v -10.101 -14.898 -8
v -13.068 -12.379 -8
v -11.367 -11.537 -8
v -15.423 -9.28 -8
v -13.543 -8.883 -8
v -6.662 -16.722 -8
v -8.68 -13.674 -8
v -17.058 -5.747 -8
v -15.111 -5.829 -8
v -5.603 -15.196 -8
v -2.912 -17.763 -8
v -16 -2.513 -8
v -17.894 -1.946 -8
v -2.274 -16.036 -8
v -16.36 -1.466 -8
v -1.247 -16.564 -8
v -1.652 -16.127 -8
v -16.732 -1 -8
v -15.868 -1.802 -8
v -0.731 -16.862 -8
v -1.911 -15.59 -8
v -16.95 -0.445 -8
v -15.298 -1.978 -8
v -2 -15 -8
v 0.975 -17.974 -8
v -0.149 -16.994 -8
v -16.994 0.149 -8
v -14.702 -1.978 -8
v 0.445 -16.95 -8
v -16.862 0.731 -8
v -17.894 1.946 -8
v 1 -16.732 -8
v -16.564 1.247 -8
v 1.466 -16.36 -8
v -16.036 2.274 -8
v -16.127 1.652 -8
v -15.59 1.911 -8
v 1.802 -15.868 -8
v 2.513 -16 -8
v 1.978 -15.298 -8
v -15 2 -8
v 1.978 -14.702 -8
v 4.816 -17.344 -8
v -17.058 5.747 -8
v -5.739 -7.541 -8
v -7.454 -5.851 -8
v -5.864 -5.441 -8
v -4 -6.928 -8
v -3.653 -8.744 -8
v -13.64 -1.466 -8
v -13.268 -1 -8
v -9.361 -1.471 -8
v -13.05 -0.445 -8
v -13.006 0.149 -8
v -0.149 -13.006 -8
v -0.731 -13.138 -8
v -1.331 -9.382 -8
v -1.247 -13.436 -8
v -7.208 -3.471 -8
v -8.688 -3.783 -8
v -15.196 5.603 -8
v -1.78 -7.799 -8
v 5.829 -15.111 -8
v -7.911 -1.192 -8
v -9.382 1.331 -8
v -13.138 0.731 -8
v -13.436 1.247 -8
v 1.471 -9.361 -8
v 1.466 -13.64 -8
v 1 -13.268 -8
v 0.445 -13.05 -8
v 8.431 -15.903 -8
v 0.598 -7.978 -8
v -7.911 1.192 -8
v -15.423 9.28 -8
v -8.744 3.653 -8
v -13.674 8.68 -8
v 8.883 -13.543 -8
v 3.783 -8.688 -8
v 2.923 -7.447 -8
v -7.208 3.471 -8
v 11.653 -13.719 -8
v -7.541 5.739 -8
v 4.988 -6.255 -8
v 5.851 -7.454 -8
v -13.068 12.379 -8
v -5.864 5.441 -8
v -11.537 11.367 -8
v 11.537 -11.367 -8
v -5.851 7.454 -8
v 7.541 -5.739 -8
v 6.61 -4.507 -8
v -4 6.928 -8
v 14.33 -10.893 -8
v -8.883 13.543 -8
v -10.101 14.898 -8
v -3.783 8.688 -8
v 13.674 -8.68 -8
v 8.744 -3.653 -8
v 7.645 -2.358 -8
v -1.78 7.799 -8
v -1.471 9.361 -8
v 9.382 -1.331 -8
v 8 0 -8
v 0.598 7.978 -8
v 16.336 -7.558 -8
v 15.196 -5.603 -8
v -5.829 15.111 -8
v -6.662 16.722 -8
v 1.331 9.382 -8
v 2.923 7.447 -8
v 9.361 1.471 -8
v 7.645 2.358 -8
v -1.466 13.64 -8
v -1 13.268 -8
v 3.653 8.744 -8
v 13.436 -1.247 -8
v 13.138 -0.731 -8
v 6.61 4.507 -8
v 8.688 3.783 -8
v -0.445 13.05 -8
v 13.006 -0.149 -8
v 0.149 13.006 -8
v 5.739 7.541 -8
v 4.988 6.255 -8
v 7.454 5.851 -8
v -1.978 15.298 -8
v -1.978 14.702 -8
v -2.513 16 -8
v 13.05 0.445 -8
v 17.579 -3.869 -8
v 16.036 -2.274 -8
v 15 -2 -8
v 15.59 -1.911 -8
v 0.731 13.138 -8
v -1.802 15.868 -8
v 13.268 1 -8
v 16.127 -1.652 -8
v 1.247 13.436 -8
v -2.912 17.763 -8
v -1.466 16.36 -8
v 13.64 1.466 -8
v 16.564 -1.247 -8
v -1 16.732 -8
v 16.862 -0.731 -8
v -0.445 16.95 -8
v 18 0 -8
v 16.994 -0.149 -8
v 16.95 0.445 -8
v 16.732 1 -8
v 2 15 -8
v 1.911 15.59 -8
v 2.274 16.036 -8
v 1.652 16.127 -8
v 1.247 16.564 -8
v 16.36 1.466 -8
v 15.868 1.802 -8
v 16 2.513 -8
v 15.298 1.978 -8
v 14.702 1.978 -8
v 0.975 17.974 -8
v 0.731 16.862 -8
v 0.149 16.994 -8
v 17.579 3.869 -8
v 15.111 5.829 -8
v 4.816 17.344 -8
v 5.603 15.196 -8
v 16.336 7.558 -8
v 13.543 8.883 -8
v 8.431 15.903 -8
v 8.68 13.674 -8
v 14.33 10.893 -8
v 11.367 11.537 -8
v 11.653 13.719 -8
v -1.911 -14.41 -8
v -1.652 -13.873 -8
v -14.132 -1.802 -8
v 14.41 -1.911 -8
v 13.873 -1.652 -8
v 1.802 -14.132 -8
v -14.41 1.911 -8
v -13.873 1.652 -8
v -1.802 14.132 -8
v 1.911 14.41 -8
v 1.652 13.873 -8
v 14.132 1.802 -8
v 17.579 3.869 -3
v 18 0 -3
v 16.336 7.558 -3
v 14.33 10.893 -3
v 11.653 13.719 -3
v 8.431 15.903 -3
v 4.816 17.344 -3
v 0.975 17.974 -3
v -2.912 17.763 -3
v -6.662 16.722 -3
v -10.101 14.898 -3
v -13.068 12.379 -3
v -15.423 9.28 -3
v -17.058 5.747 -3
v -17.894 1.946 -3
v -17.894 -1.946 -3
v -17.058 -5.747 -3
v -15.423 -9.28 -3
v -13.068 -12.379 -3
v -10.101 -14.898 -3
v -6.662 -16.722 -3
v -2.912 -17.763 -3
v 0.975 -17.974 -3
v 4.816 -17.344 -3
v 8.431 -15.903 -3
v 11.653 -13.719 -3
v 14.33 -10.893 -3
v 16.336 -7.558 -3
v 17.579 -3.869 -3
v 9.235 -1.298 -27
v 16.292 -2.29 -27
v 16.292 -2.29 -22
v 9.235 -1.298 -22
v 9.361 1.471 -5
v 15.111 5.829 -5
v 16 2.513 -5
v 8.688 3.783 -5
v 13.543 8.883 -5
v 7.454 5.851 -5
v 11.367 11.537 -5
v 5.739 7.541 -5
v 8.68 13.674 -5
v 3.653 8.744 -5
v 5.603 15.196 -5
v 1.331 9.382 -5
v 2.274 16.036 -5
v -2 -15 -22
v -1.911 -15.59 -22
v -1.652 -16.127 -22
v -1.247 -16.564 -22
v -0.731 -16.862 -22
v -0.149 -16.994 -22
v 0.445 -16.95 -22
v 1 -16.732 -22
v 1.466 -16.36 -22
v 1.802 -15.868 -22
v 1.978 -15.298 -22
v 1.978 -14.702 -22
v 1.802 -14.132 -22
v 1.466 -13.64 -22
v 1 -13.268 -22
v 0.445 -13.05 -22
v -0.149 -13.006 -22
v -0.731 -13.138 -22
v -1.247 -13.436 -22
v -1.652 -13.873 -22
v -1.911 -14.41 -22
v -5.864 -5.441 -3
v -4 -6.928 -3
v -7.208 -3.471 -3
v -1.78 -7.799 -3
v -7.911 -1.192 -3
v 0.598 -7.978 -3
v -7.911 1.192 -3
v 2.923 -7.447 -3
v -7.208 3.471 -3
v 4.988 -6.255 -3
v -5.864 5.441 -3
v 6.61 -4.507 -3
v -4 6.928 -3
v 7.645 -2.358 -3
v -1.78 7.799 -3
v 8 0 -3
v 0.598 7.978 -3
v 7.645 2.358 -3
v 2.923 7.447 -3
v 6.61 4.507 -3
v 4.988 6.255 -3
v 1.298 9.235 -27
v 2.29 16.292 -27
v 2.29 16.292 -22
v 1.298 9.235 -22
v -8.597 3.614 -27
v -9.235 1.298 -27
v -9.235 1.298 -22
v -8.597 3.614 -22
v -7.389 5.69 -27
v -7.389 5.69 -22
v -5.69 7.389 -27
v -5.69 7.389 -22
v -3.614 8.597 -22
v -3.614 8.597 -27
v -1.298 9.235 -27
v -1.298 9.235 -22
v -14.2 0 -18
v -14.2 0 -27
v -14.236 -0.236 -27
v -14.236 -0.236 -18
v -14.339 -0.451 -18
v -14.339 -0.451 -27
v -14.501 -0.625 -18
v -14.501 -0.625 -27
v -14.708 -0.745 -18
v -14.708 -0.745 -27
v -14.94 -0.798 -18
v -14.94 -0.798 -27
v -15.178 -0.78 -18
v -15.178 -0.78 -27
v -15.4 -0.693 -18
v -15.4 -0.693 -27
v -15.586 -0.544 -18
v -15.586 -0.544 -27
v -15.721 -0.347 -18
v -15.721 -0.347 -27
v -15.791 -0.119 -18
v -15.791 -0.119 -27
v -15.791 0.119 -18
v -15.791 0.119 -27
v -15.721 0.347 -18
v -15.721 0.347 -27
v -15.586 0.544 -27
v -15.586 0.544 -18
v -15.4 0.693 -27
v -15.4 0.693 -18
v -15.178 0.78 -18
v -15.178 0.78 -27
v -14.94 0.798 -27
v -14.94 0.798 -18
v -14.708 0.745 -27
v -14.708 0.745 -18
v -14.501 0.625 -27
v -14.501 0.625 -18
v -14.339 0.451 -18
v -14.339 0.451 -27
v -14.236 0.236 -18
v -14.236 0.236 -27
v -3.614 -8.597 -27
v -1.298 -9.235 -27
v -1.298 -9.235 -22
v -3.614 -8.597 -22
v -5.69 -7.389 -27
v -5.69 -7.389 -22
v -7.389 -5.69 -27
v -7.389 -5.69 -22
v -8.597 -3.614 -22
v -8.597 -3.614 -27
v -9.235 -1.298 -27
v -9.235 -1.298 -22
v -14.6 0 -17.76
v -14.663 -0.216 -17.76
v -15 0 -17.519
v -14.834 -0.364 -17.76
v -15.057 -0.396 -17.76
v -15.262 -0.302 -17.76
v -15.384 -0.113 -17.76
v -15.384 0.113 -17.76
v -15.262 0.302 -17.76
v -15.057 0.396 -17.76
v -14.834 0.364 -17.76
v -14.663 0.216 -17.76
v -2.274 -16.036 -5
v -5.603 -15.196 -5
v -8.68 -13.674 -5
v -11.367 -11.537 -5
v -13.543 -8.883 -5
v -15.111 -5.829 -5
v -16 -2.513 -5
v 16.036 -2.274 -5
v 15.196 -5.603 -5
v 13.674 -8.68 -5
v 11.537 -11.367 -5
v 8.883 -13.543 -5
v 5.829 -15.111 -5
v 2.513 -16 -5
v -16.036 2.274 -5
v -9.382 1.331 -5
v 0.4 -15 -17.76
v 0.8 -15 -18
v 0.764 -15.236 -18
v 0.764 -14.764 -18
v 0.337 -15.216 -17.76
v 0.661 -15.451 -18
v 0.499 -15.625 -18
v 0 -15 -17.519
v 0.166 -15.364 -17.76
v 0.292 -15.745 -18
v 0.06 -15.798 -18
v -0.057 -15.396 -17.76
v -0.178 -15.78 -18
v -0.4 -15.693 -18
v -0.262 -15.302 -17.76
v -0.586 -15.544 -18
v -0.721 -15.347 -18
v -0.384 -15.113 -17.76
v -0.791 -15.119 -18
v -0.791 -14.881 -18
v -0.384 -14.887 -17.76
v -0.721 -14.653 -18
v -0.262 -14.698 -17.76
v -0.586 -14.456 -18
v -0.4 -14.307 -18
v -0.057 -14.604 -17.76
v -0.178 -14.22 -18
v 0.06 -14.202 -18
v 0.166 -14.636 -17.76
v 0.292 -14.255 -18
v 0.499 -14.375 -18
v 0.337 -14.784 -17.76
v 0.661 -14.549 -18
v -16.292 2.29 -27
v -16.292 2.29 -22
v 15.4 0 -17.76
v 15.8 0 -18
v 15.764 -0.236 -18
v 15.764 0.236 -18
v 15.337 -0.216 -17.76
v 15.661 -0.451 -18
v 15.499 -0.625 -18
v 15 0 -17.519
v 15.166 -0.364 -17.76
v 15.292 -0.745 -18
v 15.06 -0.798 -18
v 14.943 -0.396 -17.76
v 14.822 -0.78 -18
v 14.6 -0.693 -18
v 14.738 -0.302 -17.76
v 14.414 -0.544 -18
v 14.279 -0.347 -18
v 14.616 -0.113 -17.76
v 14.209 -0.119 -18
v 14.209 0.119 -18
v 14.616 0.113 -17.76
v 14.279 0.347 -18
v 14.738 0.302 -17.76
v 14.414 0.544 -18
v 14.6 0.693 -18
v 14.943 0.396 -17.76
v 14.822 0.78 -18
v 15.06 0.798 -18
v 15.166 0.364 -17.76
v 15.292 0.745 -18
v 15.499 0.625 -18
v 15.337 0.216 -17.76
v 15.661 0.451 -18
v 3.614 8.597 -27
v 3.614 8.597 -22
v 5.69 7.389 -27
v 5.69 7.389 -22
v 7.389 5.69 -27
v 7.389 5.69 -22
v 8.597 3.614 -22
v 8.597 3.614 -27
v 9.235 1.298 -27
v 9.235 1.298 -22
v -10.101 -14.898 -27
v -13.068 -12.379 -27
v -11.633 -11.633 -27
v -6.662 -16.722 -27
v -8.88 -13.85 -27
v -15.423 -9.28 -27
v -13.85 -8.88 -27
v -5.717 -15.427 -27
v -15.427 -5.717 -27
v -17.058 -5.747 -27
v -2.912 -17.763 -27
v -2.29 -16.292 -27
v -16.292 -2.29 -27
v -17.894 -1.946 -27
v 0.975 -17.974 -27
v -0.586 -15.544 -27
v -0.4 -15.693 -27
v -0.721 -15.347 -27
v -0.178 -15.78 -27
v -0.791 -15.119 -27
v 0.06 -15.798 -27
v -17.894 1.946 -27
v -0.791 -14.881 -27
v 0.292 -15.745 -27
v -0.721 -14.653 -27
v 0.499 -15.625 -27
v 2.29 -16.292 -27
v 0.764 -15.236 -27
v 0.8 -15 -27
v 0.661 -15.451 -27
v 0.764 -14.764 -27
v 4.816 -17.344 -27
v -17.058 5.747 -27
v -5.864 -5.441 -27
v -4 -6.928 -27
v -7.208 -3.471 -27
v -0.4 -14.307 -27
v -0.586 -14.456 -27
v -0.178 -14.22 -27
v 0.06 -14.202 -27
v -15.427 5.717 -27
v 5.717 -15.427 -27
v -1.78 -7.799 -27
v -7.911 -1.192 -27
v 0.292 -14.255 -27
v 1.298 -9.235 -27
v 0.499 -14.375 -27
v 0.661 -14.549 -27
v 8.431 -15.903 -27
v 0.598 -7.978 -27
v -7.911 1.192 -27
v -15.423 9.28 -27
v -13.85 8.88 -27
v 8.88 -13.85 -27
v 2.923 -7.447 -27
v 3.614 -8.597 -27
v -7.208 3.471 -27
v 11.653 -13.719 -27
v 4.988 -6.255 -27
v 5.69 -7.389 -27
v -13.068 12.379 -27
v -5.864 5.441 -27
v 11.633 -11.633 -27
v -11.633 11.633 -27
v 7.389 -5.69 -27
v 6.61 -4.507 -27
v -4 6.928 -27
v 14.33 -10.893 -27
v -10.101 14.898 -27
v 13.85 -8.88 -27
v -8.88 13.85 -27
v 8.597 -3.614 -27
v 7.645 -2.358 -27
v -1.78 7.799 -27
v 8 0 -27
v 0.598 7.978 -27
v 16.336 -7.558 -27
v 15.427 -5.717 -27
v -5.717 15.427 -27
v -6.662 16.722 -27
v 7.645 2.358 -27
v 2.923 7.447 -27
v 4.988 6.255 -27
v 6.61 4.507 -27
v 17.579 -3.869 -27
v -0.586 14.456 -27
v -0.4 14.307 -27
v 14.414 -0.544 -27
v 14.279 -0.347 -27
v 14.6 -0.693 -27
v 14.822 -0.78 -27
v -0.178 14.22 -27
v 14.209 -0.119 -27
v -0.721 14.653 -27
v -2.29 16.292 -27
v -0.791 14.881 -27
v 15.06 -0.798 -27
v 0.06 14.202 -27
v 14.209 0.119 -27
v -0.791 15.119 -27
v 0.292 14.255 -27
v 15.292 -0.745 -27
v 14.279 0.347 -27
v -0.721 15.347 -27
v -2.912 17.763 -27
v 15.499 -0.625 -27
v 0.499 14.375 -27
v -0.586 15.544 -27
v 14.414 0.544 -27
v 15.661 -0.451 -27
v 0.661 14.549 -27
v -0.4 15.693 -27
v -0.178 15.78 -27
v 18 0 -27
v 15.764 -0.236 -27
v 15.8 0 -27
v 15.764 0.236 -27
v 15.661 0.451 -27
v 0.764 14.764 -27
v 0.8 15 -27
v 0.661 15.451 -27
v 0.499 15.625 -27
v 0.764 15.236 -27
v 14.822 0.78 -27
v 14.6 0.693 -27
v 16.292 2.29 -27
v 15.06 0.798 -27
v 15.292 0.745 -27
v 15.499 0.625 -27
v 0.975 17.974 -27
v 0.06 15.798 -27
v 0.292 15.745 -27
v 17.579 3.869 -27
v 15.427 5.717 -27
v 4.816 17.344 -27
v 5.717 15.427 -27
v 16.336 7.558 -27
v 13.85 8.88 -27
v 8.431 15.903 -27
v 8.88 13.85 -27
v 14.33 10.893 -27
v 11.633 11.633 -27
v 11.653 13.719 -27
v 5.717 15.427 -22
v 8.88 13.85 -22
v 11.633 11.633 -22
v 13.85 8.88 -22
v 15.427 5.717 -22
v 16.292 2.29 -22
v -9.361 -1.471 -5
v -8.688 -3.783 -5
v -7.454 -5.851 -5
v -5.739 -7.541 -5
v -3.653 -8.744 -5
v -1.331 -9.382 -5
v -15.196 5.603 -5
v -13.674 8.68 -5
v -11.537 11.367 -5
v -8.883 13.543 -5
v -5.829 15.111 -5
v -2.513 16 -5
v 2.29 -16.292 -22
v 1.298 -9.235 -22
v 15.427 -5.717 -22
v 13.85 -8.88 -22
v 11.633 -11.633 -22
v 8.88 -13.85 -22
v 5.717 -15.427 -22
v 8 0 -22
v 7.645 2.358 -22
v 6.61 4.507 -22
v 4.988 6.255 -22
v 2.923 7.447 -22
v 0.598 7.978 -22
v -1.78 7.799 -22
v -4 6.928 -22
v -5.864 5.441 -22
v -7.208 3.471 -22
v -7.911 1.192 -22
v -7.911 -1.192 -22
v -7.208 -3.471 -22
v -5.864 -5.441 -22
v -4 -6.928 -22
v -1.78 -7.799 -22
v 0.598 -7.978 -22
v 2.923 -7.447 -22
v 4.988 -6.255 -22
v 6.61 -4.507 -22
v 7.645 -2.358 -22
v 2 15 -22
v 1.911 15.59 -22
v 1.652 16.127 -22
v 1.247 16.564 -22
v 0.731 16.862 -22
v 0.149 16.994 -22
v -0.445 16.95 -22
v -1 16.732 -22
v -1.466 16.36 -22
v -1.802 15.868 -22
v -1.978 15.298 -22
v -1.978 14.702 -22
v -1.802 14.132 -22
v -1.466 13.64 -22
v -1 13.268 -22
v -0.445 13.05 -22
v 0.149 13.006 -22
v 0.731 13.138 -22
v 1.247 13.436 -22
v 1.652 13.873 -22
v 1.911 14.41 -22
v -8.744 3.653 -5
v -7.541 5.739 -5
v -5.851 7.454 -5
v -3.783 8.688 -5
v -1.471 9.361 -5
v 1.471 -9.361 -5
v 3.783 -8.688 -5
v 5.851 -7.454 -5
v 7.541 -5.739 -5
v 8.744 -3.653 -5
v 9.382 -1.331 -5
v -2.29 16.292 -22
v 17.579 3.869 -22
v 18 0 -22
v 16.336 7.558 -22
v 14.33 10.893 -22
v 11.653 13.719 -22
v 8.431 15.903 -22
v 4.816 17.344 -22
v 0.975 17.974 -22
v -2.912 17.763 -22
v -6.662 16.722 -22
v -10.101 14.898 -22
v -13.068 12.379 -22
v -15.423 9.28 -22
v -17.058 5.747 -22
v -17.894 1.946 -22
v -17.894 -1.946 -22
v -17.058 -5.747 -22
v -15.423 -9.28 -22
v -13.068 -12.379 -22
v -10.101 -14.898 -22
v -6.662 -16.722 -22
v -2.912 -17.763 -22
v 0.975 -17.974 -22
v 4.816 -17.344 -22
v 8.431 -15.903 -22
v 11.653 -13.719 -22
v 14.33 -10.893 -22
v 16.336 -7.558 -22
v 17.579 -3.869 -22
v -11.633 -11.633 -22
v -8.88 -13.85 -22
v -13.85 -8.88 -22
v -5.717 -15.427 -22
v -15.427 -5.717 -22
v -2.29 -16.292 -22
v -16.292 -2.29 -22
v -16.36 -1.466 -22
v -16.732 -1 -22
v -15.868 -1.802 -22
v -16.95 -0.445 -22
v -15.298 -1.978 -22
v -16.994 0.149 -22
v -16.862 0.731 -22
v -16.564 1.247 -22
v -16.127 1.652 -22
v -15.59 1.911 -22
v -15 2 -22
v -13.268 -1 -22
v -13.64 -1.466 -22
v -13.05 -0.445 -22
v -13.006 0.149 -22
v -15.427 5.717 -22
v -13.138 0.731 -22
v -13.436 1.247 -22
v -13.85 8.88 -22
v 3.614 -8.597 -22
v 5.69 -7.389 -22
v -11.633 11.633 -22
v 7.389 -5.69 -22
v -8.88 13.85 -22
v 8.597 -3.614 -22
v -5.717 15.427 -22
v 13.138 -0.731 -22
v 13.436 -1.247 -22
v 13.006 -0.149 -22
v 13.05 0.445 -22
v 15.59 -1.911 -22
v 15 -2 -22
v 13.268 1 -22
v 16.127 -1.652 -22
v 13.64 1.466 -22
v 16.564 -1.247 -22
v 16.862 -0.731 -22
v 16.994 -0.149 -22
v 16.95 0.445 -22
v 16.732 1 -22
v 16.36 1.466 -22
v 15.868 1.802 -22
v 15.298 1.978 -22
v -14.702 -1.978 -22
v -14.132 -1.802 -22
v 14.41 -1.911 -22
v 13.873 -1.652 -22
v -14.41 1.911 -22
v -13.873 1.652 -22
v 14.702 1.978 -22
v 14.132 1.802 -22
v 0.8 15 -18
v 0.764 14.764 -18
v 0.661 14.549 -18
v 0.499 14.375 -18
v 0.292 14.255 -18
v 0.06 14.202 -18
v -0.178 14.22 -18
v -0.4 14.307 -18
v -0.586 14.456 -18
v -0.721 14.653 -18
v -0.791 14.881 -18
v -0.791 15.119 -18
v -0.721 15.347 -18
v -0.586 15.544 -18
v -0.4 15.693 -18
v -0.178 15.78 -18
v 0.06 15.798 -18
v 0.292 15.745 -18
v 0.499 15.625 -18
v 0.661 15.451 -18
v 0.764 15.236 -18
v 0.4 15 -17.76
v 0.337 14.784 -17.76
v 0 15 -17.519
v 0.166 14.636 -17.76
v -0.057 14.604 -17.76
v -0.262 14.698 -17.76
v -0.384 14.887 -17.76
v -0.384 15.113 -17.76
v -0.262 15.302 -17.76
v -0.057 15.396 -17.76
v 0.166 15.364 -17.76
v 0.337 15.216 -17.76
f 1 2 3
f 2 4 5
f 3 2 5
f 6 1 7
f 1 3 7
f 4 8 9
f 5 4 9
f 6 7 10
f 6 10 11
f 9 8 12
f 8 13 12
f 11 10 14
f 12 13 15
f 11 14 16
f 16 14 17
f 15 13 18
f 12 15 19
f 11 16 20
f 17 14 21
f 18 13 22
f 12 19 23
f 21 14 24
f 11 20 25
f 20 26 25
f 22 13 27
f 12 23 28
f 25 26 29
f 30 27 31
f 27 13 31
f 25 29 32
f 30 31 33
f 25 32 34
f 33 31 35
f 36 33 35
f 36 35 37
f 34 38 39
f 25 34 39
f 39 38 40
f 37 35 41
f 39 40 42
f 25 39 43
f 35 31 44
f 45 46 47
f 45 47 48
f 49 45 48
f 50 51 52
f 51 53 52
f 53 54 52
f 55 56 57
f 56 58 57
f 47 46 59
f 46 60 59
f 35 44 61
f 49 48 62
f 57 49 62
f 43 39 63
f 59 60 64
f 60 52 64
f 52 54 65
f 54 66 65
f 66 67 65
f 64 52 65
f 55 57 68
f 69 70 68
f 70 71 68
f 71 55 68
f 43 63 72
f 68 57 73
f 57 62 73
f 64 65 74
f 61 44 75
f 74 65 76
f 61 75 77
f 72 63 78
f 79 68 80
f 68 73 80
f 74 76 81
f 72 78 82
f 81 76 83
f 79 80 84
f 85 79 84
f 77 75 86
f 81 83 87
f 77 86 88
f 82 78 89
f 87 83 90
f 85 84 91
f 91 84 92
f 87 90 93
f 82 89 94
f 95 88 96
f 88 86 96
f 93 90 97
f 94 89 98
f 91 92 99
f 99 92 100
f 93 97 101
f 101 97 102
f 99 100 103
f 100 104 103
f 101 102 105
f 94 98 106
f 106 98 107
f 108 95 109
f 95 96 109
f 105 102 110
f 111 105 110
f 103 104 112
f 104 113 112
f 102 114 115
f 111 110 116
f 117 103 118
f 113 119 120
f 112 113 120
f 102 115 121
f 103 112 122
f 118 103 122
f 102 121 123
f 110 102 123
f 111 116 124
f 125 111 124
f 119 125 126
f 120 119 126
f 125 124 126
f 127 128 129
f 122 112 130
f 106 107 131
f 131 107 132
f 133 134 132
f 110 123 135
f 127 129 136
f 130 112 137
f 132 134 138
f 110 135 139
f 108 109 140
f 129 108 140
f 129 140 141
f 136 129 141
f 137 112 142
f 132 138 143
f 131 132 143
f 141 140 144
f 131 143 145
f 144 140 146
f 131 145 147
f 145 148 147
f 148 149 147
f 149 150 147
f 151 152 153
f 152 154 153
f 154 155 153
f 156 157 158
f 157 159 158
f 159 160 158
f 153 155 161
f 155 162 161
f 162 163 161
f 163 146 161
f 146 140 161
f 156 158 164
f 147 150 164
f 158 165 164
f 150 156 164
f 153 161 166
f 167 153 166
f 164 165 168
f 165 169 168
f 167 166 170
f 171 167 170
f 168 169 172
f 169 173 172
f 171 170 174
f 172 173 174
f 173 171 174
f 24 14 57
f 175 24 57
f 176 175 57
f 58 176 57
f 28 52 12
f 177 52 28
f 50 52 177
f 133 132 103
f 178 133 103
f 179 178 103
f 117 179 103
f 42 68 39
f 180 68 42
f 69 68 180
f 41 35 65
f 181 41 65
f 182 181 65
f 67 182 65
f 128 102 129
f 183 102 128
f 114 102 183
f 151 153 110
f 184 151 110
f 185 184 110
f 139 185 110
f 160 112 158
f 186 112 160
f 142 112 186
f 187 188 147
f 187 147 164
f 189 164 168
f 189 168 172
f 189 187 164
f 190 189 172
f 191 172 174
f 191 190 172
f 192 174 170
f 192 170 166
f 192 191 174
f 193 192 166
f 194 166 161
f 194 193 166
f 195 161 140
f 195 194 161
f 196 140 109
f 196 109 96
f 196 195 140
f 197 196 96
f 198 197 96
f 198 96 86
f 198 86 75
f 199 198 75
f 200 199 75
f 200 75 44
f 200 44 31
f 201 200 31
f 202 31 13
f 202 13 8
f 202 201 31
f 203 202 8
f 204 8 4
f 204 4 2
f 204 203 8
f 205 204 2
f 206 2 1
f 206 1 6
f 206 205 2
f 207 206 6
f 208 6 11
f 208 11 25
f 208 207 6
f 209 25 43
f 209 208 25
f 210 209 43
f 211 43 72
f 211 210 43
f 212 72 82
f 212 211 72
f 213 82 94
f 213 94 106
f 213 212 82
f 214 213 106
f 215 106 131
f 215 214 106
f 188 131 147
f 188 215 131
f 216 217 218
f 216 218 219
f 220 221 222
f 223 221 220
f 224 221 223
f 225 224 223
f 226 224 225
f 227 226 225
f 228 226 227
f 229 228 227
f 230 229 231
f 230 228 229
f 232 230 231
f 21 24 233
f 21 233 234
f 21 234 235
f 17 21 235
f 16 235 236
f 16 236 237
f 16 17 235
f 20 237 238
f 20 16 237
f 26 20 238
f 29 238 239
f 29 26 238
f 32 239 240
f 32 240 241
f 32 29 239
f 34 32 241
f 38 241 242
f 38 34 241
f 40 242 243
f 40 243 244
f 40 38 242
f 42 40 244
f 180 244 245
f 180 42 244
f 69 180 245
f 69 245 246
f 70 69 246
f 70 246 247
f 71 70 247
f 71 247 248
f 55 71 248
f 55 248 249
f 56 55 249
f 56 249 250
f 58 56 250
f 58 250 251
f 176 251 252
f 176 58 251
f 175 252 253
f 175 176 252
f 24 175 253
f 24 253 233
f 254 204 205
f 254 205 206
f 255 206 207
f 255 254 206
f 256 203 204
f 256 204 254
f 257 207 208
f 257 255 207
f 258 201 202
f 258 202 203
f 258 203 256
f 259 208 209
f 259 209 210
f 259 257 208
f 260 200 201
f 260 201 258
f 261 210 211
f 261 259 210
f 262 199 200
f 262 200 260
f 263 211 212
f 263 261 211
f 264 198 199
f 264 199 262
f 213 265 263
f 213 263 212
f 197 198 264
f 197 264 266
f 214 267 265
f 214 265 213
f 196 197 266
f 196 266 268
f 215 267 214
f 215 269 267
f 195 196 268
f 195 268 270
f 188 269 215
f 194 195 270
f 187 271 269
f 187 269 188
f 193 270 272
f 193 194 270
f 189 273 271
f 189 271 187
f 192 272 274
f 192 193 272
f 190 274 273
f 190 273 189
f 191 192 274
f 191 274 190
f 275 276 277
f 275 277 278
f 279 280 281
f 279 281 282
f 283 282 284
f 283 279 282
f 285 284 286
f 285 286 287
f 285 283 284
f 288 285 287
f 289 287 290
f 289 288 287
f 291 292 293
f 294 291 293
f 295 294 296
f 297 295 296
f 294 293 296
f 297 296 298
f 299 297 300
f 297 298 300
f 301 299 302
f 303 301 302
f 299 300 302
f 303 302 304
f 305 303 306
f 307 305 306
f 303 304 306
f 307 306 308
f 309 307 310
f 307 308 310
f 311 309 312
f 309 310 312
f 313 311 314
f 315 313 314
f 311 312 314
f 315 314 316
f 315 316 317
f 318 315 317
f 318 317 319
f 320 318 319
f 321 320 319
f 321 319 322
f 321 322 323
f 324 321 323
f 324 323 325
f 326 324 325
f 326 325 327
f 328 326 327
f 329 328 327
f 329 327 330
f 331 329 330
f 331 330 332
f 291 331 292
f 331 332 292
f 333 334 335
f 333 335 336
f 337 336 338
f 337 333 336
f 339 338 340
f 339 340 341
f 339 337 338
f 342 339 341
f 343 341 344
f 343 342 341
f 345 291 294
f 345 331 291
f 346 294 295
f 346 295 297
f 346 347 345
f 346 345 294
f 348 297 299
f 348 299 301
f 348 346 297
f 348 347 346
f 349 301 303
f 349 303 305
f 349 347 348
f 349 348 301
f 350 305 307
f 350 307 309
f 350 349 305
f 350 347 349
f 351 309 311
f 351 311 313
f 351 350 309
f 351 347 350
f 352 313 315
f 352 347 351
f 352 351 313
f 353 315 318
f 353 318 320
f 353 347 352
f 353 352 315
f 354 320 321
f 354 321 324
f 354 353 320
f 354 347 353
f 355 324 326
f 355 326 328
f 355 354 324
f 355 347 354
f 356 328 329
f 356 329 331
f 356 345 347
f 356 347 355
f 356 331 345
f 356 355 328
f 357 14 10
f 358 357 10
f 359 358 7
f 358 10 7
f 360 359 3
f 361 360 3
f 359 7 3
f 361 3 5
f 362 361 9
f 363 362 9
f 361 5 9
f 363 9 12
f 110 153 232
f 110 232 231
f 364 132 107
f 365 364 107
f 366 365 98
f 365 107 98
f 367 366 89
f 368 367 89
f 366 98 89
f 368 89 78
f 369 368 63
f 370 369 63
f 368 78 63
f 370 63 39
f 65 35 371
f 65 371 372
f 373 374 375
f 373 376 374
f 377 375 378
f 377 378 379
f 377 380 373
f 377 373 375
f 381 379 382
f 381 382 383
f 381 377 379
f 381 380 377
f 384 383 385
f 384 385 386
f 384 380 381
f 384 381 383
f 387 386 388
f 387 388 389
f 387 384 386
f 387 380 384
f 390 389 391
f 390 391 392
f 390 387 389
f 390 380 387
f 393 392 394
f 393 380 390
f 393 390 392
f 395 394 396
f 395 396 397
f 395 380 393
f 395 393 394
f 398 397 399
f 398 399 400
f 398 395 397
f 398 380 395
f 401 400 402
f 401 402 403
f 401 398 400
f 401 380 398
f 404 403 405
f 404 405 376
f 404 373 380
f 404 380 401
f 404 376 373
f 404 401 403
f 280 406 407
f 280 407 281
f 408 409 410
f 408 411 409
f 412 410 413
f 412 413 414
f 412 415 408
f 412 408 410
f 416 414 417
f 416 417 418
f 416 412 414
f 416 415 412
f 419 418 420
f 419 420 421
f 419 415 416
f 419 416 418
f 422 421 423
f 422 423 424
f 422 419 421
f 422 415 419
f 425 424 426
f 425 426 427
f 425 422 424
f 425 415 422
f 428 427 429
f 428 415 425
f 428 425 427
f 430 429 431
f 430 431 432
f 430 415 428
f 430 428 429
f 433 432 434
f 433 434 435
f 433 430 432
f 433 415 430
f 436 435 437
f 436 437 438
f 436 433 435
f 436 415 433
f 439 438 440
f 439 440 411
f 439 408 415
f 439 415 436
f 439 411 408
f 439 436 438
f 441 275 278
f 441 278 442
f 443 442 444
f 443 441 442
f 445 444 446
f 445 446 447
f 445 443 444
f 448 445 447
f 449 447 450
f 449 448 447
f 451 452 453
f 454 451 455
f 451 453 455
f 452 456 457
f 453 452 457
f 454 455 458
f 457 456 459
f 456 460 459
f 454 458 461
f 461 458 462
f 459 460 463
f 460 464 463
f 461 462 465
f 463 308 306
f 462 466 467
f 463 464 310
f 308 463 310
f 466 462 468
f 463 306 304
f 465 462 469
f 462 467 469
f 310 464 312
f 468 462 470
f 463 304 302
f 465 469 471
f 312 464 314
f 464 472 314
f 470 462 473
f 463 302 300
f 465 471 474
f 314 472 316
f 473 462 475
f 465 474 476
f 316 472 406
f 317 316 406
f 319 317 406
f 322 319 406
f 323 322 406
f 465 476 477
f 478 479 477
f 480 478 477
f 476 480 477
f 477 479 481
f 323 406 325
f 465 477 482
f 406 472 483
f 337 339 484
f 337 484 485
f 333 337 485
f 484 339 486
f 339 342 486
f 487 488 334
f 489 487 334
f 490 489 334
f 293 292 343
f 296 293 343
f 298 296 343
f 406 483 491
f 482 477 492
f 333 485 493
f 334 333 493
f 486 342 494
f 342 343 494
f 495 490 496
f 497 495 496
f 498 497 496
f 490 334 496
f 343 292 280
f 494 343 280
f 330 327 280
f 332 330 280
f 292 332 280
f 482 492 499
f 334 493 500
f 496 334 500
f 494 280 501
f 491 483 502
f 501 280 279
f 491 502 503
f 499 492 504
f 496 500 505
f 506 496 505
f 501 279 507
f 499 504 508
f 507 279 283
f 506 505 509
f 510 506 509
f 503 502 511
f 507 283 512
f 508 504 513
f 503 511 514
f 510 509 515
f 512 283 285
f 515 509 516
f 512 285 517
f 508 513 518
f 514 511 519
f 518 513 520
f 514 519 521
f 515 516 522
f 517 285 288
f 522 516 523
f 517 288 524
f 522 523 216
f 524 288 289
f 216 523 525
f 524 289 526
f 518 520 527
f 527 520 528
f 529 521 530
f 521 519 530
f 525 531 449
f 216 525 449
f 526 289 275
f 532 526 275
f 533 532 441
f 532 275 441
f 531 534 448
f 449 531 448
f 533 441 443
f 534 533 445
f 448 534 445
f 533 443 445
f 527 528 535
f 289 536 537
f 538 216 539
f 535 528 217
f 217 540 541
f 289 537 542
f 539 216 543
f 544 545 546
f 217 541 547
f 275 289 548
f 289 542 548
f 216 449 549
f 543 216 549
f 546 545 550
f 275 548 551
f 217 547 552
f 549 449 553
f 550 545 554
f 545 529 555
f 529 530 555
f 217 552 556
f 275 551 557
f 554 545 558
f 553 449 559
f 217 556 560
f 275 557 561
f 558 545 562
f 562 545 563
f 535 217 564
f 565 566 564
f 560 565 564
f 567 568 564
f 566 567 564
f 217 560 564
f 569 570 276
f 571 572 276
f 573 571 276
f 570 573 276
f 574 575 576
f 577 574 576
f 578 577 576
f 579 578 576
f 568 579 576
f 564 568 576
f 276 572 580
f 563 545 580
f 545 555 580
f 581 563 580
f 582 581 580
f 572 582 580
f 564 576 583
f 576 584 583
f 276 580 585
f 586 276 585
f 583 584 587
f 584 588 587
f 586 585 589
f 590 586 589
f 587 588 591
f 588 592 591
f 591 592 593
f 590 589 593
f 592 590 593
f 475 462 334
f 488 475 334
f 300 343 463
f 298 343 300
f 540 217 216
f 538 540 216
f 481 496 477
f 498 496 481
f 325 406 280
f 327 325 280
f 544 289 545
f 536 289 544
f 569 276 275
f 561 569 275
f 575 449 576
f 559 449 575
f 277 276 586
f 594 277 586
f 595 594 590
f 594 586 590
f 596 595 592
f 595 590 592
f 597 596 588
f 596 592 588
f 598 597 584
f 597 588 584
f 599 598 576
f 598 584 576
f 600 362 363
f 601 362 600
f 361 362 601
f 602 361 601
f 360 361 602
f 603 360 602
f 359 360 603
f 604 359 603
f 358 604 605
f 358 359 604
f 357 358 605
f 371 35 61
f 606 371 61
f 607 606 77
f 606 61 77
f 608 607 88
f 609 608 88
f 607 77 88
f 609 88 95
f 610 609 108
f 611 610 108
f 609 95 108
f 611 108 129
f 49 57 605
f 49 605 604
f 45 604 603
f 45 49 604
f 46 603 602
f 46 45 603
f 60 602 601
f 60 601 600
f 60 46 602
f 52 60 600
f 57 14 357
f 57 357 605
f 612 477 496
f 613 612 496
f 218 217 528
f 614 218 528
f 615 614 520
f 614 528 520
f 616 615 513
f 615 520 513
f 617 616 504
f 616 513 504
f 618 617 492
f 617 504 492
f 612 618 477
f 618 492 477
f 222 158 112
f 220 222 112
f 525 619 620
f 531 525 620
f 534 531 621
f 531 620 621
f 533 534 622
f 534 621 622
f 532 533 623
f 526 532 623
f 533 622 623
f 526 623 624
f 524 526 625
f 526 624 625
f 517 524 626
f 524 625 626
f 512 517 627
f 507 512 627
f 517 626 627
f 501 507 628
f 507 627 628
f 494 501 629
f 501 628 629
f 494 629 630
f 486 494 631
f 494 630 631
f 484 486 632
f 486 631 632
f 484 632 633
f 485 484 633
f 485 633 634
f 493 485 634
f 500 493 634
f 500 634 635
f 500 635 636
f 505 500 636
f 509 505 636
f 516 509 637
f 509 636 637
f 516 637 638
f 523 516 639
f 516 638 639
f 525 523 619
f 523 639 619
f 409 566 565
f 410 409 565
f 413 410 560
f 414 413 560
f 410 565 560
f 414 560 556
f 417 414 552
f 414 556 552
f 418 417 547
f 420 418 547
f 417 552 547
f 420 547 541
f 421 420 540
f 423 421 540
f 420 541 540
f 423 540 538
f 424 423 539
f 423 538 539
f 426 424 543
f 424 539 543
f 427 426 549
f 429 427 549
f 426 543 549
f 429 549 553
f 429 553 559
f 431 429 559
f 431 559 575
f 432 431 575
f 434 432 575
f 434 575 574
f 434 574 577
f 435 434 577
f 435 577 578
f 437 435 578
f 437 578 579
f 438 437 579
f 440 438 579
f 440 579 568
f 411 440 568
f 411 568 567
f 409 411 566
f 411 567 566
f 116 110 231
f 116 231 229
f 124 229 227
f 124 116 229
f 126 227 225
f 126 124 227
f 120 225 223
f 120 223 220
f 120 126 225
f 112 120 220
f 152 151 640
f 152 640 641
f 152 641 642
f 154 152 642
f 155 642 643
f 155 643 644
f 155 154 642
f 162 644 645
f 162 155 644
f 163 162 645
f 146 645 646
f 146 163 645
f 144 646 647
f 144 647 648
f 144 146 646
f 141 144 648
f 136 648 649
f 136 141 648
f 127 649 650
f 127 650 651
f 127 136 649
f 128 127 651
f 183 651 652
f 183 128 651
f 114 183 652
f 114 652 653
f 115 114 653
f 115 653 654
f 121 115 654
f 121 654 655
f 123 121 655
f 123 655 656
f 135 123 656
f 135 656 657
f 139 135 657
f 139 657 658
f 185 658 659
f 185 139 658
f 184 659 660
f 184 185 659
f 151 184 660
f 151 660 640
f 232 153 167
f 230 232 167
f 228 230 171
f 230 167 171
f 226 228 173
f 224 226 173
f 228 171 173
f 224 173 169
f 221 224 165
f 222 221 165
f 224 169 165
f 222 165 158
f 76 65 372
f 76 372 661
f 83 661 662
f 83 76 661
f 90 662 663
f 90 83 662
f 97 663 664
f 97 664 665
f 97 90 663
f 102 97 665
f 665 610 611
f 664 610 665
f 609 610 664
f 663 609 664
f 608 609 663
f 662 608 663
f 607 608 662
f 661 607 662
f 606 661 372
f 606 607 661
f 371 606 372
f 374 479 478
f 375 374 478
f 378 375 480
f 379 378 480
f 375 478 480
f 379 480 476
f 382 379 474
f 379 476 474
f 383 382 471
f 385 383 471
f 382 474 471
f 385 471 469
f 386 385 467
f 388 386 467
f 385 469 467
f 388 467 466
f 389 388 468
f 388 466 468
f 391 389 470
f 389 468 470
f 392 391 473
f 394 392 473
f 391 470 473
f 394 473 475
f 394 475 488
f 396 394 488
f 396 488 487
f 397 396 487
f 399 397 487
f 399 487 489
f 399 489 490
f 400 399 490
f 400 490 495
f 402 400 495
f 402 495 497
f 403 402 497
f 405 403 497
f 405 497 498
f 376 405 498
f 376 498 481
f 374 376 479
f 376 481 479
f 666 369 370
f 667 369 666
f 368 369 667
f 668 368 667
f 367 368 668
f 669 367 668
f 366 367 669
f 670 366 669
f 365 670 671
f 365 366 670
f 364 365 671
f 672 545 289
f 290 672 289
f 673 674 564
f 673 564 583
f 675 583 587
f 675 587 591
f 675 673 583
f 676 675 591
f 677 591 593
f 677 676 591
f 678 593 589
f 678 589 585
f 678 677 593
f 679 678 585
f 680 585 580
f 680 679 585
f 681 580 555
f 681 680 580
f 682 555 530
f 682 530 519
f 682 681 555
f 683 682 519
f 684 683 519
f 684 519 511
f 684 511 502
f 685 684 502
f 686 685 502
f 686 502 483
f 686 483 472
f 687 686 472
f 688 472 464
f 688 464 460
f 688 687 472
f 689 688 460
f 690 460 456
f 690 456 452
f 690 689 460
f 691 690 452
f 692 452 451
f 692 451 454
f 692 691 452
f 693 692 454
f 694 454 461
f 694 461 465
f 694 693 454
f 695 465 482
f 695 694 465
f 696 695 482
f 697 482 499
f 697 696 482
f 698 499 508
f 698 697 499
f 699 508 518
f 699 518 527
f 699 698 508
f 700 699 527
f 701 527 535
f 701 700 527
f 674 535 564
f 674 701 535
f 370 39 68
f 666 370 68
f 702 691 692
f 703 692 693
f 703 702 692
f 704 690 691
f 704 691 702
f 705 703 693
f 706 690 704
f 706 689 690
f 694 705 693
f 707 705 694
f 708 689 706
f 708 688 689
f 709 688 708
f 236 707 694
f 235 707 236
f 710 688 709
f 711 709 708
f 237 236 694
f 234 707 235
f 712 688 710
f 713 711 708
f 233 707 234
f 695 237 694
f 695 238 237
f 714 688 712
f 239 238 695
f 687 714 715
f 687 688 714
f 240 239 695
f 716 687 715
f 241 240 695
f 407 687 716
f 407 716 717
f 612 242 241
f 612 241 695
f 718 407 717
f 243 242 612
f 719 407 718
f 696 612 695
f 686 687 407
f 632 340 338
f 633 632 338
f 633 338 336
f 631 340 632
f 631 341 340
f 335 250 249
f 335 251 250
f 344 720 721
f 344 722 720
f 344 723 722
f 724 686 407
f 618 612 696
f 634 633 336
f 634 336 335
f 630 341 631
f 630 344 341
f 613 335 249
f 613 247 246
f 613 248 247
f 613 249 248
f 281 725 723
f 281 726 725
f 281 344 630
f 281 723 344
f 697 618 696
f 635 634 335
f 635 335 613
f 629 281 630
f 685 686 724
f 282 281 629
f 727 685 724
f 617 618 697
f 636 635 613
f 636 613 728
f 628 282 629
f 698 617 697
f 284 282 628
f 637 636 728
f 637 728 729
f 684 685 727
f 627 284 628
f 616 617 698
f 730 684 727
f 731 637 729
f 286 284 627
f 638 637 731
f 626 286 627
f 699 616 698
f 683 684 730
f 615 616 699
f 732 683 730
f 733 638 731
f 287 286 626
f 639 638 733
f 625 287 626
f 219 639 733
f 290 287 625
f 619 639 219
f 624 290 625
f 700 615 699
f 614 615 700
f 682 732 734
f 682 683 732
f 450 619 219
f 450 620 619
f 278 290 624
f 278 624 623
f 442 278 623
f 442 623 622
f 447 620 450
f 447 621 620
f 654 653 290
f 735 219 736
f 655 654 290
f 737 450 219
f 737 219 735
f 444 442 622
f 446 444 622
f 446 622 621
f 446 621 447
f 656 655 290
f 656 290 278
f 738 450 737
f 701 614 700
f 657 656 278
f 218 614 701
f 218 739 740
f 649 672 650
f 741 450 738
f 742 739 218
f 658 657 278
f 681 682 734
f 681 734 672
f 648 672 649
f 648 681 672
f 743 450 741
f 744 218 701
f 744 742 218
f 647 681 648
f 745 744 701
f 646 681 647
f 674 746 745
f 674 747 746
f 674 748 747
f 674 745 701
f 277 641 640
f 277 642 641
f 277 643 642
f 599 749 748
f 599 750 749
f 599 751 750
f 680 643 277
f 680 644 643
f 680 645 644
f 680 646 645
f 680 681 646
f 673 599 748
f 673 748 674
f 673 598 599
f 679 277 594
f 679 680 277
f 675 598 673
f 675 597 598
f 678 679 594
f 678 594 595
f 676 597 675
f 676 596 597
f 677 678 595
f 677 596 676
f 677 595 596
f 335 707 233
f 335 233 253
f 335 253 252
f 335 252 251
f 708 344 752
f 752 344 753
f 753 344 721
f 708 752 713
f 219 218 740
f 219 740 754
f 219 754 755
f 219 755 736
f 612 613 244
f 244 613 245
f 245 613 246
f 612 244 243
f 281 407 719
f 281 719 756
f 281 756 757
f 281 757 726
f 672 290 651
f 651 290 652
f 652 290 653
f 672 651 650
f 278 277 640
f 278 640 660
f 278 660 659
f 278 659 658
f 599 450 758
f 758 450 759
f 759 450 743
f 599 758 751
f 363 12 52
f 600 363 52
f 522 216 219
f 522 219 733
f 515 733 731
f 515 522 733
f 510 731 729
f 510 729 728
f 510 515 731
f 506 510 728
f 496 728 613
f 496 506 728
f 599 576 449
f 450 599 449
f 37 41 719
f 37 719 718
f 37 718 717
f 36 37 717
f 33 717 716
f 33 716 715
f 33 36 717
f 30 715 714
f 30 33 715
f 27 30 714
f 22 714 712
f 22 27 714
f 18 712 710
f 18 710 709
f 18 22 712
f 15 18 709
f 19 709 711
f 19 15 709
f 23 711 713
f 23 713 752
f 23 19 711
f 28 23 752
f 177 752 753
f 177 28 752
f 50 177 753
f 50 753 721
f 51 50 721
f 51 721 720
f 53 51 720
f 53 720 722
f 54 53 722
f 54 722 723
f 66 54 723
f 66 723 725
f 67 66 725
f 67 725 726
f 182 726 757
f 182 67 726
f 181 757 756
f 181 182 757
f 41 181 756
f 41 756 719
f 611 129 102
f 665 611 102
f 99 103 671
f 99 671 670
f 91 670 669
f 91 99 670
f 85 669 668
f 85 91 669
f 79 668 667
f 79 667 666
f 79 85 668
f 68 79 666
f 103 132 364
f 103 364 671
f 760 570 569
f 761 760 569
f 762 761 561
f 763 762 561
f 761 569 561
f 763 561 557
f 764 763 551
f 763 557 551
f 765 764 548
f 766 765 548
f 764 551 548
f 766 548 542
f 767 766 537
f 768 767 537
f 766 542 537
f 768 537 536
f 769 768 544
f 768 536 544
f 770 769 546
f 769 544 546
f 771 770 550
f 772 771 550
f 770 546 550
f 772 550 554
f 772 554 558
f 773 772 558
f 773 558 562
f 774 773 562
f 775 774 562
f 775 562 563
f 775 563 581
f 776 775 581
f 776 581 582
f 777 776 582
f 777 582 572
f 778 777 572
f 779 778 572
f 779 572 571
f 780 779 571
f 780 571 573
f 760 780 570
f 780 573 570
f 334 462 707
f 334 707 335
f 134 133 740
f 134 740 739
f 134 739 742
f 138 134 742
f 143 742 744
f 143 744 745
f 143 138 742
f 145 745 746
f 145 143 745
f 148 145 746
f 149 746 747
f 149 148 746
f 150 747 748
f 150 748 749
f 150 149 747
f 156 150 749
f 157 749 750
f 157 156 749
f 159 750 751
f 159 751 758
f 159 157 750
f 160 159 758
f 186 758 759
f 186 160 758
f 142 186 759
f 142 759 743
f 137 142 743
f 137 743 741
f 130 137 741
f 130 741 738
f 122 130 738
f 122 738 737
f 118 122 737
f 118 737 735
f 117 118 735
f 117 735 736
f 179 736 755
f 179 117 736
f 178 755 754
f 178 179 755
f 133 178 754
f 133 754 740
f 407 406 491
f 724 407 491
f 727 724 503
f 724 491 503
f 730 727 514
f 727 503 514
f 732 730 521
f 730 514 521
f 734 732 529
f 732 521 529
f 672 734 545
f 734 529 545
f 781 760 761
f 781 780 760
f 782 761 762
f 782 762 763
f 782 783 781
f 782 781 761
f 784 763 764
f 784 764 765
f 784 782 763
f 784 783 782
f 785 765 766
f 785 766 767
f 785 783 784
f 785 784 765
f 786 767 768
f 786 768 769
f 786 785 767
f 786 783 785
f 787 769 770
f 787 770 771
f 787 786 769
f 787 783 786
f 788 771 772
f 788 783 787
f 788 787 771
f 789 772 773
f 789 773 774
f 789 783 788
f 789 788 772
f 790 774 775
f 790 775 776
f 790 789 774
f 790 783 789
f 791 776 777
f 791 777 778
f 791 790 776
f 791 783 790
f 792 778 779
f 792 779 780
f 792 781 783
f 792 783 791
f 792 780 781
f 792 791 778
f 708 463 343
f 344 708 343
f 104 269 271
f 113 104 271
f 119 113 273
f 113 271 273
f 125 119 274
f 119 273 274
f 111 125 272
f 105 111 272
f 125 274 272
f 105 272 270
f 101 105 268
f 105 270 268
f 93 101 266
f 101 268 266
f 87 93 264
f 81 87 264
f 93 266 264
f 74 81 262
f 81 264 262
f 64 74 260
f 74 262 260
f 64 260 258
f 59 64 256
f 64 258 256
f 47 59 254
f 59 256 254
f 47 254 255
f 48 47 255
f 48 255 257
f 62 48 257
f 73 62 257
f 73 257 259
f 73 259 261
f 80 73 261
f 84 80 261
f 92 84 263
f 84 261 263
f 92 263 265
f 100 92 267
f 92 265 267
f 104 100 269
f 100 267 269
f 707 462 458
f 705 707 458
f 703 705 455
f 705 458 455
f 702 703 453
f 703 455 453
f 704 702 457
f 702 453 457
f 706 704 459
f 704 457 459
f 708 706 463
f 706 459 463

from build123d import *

# Parameters (mm, degrees)
SKETCH004_R           = 18
SKETCH004_R_2         = 8
PAD005_DEPTH          = 5
POCKET003_DEPTH       = 3
POLARPATTERN002_COUNT = 4
SKETCH005_R           = 2
PAD006_DEPTH          = 14
POLARPATTERN_COUNT    = 4
SKETCH006_R           = 18
SKETCH006_R_2         = 8
PAD007_DEPTH          = 5
POCKET001_DEPTH       = 5
POLARPATTERN001_COUNT = 4
SKETCH017_R           = 0.8
HOLE_DEPTH            = 9
HOLE_TIPS_R           = 0.8


with BuildPart() as part:
    # Sketch004 → Pad005 (new body)
    with BuildSketch(Plane.XY.offset(3)):
        Circle(SKETCH004_R)
        Circle(SKETCH004_R_2, mode=Mode.SUBTRACT)
    extrude(amount=-PAD005_DEPTH)

    # Sketch016 (on Face4 of Pad005) → Pocket003 (cut)
    with BuildSketch(Plane(origin=(0, 0, -2), x_dir=(1, 0, 0), z_dir=(0, 0, -1))):
        with BuildLine():
            ThreePointArc((-2.274320715, 16.0355366217), (-11.366542794, 11.537446614), (-15.9998121466, 2.5133604465))
            Line((-15.9998121466, 2.5133604465), (-9.3613070154, 1.4705384391))
            ThreePointArc((-1.3306790273, 9.382208997), (-6.6504341316, 6.7504280011), (-9.3613070154, 1.4705384391))
            Line((-2.274320715, 16.0355366217), (-1.3306790273, 9.382208997))
        make_face()
    pocket003 = extrude(amount=-POCKET003_DEPTH, mode=Mode.SUBTRACT)

    # PolarPattern002: Pocket003 ×4 about axis
    polarpattern002_axis = Axis((0, 0, -2), (0, 0, -1))
    for i in range(1, POLARPATTERN002_COUNT):
        add(pocket003.rotate(polarpattern002_axis, i * 360 / POLARPATTERN002_COUNT), mode=Mode.SUBTRACT)

    # Sketch005 (on Face3 of Pad005) → Pad006 (join)
    with BuildSketch(Plane.XY.offset(-2)):
        with Locations((0, 15)):
            Circle(SKETCH005_R)
    pad006 = extrude(amount=-PAD006_DEPTH)

    # PolarPattern: Pad006 ×4 about axis
    polarpattern_axis = Axis((0, 0, 0), (0, 0, 1))
    for i in range(1, POLARPATTERN_COUNT):
        add(pad006.rotate(polarpattern_axis, i * 360 / POLARPATTERN_COUNT))

    # Sketch006 → Pad007 (join)
    with BuildSketch(Plane.XY.offset(-16)):
        Circle(SKETCH006_R)
        Circle(SKETCH006_R_2, mode=Mode.SUBTRACT)
    extrude(amount=-PAD007_DEPTH)

    # Sketch011 (on Face3 of Pad007) → Pocket001 (cut)
    with BuildSketch(Plane(origin=(0, 0, -21), x_dir=(1, 0, 0), z_dir=(0, 0, -1))):
        with BuildLine():
            ThreePointArc((9.2353888952, 1.2979492641), (6.5945841544, 6.5945841544), (1.2979492641, 9.2353888952))
            Line((2.2896869549, 16.2919692324), (1.2979492641, 9.2353888952))
            ThreePointArc((16.2919692324, 2.2896869549), (11.6333771498, 11.6333771498), (2.2896869549, 16.2919692324))
            Line((16.2919692324, 2.2896869549), (9.2353888952, 1.2979492641))
        make_face()
    pocket001 = extrude(amount=-POCKET001_DEPTH, mode=Mode.SUBTRACT)

    # PolarPattern001: Pocket001 ×4 about axis
    polarpattern001_axis = Axis((0, 0, 0), (0, 0, 1))
    for i in range(1, POLARPATTERN001_COUNT):
        add(pocket001.rotate(polarpattern001_axis, i * 360 / POLARPATTERN001_COUNT), mode=Mode.SUBTRACT)

    # Sketch017 (on Face3 of PolarPattern001) → Hole (cut)
    with BuildSketch(Plane(origin=(0, 0, -21), x_dir=(1, 0, 0), z_dir=(0, 0, -1))):
        with Locations((0, 15)):
            Circle(SKETCH017_R)
        with Locations((0, -15)):
            Circle(SKETCH017_R)
        with Locations((-15, 0)):
            Circle(SKETCH017_R)
        with Locations((15, 0)):
            Circle(SKETCH017_R)
    extrude(amount=-HOLE_DEPTH, mode=Mode.SUBTRACT)

    # Hole tips → Hole tip 1 section 0
    with BuildSketch(Plane(origin=(0, 0, -12), x_dir=(1, 0, 0), z_dir=(0, 0, -1)), mode=Mode.PRIVATE) as hole_tip_1_s0:
        with Locations((0, 15)):
            Circle(HOLE_TIPS_R)
    loft([hole_tip_1_s0.sketch, Vertex(0, -15, -11.5193115048)], mode=Mode.SUBTRACT)

    # Hole tips → Hole tip 2 section 0
    with BuildSketch(Plane(origin=(0, 0, -12), x_dir=(1, 0, 0), z_dir=(0, 0, -1)), mode=Mode.PRIVATE) as hole_tip_2_s0:
        with Locations((0, -15)):
            Circle(HOLE_TIPS_R)
    loft([hole_tip_2_s0.sketch, Vertex(0, 15, -11.5193115048)], mode=Mode.SUBTRACT)

    # Hole tips → Hole tip 3 section 0
    with BuildSketch(Plane(origin=(0, 0, -12), x_dir=(1, 0, 0), z_dir=(0, 0, -1)), mode=Mode.PRIVATE) as hole_tip_3_s0:
        with Locations((-15, 0)):
            Circle(HOLE_TIPS_R)
    loft([hole_tip_3_s0.sketch, Vertex(-15, 0, -11.5193115048)], mode=Mode.SUBTRACT)

    # Hole tips → Hole tip 4 section 0
    with BuildSketch(Plane(origin=(0, 0, -12), x_dir=(1, 0, 0), z_dir=(0, 0, -1)), mode=Mode.PRIVATE) as hole_tip_4_s0:
        with Locations((15, 0)):
            Circle(HOLE_TIPS_R)
    loft([hole_tip_4_s0.sketch, Vertex(15, 0, -11.5193115048)], mode=Mode.SUBTRACT)


with BuildPart() as part_1:
    # Body002 placement: moved
    add(part.part.moved(Location((0, 0, -6))))


solid = part_1.part
